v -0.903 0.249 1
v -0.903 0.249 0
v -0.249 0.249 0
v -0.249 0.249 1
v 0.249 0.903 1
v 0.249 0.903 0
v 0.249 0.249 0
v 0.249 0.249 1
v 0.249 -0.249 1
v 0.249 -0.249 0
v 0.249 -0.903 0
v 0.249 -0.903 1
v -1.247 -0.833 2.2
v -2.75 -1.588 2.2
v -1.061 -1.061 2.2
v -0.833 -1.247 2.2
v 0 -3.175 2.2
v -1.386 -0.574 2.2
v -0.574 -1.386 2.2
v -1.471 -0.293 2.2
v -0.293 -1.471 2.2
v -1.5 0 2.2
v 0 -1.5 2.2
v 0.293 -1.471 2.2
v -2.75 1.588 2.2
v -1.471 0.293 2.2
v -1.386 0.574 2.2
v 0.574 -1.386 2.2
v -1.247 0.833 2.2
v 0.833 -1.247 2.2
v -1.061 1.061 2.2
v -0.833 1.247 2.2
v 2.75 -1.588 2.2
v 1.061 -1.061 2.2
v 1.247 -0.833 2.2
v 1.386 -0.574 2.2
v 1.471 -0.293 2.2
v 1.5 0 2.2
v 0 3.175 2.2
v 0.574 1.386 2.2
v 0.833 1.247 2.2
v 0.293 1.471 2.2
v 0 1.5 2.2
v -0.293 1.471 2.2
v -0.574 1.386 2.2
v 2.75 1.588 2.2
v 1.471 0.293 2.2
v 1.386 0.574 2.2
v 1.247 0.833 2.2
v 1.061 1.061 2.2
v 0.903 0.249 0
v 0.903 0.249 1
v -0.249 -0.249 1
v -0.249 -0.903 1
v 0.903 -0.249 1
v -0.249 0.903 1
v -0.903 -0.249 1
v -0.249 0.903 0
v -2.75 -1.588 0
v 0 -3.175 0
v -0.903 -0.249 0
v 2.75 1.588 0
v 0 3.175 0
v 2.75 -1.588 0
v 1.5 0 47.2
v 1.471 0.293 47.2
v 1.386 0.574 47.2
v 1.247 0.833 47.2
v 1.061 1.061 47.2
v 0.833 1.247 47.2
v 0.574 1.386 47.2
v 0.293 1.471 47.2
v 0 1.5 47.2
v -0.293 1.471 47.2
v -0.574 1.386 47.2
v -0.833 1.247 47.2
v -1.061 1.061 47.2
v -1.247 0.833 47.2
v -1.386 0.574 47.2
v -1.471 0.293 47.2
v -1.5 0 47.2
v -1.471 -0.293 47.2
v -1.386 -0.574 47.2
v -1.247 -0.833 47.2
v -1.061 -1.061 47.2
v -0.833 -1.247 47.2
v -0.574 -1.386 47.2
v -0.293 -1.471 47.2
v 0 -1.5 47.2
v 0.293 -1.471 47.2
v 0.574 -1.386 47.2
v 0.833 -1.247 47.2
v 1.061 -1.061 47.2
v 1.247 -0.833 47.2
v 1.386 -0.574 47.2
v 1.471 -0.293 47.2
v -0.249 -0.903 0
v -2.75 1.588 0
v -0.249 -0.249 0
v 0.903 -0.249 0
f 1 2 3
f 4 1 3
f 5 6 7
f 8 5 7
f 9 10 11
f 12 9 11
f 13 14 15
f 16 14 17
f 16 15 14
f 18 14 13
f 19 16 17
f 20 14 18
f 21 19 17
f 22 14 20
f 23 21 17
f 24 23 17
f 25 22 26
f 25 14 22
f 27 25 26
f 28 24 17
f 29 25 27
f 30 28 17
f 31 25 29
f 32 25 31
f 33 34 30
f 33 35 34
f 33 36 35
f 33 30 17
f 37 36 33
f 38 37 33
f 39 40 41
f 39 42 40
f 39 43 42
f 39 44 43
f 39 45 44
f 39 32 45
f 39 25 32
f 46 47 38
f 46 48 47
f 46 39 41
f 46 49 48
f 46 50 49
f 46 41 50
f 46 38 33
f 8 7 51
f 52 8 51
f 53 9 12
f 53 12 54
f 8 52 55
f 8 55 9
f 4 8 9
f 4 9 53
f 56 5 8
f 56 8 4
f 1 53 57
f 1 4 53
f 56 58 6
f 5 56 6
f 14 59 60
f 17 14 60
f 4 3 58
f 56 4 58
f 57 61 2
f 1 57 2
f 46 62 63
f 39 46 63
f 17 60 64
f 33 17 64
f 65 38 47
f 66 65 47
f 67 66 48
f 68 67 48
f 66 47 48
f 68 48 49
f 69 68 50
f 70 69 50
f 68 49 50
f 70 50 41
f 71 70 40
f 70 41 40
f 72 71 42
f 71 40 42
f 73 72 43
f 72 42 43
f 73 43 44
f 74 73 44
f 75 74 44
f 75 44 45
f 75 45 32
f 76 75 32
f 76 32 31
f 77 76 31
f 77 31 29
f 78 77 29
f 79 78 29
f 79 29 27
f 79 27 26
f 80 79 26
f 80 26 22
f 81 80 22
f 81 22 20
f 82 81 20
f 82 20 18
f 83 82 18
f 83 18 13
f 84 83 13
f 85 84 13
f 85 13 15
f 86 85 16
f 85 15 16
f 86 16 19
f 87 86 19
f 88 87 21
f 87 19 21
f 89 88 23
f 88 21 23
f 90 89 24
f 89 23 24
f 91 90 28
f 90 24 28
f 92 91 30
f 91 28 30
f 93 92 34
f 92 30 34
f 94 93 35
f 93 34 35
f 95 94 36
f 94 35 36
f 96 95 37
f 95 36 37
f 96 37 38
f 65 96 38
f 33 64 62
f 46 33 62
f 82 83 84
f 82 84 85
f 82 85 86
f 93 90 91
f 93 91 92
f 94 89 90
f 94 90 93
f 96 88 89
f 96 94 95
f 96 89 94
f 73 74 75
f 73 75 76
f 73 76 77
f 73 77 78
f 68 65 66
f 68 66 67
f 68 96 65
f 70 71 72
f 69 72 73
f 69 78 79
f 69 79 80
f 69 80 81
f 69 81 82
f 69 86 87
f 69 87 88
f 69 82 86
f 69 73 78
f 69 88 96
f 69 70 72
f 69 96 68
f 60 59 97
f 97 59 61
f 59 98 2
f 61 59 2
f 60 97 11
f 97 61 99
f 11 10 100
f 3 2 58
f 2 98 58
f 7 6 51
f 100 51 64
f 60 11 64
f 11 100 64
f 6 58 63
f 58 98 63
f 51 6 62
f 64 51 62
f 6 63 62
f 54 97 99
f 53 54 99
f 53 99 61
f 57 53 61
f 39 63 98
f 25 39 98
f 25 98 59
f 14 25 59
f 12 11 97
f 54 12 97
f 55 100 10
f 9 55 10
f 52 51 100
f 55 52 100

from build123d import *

# Parameters (mm, degrees)
SKETCH_1_R               = 1.5
EXTRUDE_3_DEPTH          = 2.2
SKETCH_1_6_R             = 1.5
EXTRUDE_4_DEPTH          = 47.2
CUT_EXTRUDE_1_DEPTH      = 1
CUT_EXTRUDE_1_DEPTH_BACK = 1


with BuildPart() as part:
    # 草图1 → 凸台-拉伸3 (new body)
    with BuildSketch(Plane.XY):
        Polygon((-2.75, -1.58771324), (0, -3.175426481), (2.75, -1.58771324), (2.75, 1.58771324), (0, 3.175426481), (-2.75, 1.58771324), align=None)
        Circle(SKETCH_1_R, mode=Mode.SUBTRACT)
    extrude(amount=EXTRUDE_3_DEPTH)

    # 草图1<6> → 凸台-拉伸4 (add)
    with BuildSketch(Plane.XY):
        Circle(SKETCH_1_6_R)
    extrude(amount=EXTRUDE_4_DEPTH)

    # 草图1<9> → 切除-拉伸1 (cut, two sides: drawn at the far end of the back side and taken through both)
    with BuildSketch(Plane.XY.offset(-CUT_EXTRUDE_1_DEPTH_BACK)):
        Polygon((0.249002884, 0.249002884), (0.249002884, 0.902887914), (-0.249002884, 0.902887914), (-0.249002884, 0.249002884), (-0.902887914, 0.249002884), (-0.902887914, -0.249002884), (-0.249002884, -0.249002884), (-0.249002884, -0.902887914), (0.249002884, -0.902887914), (0.249002884, -0.249002884), (0.902887914, -0.249002884), (0.902887914, 0.249002884), align=None)
    extrude(amount=CUT_EXTRUDE_1_DEPTH + CUT_EXTRUDE_1_DEPTH_BACK, mode=Mode.SUBTRACT)


solid = part.part
